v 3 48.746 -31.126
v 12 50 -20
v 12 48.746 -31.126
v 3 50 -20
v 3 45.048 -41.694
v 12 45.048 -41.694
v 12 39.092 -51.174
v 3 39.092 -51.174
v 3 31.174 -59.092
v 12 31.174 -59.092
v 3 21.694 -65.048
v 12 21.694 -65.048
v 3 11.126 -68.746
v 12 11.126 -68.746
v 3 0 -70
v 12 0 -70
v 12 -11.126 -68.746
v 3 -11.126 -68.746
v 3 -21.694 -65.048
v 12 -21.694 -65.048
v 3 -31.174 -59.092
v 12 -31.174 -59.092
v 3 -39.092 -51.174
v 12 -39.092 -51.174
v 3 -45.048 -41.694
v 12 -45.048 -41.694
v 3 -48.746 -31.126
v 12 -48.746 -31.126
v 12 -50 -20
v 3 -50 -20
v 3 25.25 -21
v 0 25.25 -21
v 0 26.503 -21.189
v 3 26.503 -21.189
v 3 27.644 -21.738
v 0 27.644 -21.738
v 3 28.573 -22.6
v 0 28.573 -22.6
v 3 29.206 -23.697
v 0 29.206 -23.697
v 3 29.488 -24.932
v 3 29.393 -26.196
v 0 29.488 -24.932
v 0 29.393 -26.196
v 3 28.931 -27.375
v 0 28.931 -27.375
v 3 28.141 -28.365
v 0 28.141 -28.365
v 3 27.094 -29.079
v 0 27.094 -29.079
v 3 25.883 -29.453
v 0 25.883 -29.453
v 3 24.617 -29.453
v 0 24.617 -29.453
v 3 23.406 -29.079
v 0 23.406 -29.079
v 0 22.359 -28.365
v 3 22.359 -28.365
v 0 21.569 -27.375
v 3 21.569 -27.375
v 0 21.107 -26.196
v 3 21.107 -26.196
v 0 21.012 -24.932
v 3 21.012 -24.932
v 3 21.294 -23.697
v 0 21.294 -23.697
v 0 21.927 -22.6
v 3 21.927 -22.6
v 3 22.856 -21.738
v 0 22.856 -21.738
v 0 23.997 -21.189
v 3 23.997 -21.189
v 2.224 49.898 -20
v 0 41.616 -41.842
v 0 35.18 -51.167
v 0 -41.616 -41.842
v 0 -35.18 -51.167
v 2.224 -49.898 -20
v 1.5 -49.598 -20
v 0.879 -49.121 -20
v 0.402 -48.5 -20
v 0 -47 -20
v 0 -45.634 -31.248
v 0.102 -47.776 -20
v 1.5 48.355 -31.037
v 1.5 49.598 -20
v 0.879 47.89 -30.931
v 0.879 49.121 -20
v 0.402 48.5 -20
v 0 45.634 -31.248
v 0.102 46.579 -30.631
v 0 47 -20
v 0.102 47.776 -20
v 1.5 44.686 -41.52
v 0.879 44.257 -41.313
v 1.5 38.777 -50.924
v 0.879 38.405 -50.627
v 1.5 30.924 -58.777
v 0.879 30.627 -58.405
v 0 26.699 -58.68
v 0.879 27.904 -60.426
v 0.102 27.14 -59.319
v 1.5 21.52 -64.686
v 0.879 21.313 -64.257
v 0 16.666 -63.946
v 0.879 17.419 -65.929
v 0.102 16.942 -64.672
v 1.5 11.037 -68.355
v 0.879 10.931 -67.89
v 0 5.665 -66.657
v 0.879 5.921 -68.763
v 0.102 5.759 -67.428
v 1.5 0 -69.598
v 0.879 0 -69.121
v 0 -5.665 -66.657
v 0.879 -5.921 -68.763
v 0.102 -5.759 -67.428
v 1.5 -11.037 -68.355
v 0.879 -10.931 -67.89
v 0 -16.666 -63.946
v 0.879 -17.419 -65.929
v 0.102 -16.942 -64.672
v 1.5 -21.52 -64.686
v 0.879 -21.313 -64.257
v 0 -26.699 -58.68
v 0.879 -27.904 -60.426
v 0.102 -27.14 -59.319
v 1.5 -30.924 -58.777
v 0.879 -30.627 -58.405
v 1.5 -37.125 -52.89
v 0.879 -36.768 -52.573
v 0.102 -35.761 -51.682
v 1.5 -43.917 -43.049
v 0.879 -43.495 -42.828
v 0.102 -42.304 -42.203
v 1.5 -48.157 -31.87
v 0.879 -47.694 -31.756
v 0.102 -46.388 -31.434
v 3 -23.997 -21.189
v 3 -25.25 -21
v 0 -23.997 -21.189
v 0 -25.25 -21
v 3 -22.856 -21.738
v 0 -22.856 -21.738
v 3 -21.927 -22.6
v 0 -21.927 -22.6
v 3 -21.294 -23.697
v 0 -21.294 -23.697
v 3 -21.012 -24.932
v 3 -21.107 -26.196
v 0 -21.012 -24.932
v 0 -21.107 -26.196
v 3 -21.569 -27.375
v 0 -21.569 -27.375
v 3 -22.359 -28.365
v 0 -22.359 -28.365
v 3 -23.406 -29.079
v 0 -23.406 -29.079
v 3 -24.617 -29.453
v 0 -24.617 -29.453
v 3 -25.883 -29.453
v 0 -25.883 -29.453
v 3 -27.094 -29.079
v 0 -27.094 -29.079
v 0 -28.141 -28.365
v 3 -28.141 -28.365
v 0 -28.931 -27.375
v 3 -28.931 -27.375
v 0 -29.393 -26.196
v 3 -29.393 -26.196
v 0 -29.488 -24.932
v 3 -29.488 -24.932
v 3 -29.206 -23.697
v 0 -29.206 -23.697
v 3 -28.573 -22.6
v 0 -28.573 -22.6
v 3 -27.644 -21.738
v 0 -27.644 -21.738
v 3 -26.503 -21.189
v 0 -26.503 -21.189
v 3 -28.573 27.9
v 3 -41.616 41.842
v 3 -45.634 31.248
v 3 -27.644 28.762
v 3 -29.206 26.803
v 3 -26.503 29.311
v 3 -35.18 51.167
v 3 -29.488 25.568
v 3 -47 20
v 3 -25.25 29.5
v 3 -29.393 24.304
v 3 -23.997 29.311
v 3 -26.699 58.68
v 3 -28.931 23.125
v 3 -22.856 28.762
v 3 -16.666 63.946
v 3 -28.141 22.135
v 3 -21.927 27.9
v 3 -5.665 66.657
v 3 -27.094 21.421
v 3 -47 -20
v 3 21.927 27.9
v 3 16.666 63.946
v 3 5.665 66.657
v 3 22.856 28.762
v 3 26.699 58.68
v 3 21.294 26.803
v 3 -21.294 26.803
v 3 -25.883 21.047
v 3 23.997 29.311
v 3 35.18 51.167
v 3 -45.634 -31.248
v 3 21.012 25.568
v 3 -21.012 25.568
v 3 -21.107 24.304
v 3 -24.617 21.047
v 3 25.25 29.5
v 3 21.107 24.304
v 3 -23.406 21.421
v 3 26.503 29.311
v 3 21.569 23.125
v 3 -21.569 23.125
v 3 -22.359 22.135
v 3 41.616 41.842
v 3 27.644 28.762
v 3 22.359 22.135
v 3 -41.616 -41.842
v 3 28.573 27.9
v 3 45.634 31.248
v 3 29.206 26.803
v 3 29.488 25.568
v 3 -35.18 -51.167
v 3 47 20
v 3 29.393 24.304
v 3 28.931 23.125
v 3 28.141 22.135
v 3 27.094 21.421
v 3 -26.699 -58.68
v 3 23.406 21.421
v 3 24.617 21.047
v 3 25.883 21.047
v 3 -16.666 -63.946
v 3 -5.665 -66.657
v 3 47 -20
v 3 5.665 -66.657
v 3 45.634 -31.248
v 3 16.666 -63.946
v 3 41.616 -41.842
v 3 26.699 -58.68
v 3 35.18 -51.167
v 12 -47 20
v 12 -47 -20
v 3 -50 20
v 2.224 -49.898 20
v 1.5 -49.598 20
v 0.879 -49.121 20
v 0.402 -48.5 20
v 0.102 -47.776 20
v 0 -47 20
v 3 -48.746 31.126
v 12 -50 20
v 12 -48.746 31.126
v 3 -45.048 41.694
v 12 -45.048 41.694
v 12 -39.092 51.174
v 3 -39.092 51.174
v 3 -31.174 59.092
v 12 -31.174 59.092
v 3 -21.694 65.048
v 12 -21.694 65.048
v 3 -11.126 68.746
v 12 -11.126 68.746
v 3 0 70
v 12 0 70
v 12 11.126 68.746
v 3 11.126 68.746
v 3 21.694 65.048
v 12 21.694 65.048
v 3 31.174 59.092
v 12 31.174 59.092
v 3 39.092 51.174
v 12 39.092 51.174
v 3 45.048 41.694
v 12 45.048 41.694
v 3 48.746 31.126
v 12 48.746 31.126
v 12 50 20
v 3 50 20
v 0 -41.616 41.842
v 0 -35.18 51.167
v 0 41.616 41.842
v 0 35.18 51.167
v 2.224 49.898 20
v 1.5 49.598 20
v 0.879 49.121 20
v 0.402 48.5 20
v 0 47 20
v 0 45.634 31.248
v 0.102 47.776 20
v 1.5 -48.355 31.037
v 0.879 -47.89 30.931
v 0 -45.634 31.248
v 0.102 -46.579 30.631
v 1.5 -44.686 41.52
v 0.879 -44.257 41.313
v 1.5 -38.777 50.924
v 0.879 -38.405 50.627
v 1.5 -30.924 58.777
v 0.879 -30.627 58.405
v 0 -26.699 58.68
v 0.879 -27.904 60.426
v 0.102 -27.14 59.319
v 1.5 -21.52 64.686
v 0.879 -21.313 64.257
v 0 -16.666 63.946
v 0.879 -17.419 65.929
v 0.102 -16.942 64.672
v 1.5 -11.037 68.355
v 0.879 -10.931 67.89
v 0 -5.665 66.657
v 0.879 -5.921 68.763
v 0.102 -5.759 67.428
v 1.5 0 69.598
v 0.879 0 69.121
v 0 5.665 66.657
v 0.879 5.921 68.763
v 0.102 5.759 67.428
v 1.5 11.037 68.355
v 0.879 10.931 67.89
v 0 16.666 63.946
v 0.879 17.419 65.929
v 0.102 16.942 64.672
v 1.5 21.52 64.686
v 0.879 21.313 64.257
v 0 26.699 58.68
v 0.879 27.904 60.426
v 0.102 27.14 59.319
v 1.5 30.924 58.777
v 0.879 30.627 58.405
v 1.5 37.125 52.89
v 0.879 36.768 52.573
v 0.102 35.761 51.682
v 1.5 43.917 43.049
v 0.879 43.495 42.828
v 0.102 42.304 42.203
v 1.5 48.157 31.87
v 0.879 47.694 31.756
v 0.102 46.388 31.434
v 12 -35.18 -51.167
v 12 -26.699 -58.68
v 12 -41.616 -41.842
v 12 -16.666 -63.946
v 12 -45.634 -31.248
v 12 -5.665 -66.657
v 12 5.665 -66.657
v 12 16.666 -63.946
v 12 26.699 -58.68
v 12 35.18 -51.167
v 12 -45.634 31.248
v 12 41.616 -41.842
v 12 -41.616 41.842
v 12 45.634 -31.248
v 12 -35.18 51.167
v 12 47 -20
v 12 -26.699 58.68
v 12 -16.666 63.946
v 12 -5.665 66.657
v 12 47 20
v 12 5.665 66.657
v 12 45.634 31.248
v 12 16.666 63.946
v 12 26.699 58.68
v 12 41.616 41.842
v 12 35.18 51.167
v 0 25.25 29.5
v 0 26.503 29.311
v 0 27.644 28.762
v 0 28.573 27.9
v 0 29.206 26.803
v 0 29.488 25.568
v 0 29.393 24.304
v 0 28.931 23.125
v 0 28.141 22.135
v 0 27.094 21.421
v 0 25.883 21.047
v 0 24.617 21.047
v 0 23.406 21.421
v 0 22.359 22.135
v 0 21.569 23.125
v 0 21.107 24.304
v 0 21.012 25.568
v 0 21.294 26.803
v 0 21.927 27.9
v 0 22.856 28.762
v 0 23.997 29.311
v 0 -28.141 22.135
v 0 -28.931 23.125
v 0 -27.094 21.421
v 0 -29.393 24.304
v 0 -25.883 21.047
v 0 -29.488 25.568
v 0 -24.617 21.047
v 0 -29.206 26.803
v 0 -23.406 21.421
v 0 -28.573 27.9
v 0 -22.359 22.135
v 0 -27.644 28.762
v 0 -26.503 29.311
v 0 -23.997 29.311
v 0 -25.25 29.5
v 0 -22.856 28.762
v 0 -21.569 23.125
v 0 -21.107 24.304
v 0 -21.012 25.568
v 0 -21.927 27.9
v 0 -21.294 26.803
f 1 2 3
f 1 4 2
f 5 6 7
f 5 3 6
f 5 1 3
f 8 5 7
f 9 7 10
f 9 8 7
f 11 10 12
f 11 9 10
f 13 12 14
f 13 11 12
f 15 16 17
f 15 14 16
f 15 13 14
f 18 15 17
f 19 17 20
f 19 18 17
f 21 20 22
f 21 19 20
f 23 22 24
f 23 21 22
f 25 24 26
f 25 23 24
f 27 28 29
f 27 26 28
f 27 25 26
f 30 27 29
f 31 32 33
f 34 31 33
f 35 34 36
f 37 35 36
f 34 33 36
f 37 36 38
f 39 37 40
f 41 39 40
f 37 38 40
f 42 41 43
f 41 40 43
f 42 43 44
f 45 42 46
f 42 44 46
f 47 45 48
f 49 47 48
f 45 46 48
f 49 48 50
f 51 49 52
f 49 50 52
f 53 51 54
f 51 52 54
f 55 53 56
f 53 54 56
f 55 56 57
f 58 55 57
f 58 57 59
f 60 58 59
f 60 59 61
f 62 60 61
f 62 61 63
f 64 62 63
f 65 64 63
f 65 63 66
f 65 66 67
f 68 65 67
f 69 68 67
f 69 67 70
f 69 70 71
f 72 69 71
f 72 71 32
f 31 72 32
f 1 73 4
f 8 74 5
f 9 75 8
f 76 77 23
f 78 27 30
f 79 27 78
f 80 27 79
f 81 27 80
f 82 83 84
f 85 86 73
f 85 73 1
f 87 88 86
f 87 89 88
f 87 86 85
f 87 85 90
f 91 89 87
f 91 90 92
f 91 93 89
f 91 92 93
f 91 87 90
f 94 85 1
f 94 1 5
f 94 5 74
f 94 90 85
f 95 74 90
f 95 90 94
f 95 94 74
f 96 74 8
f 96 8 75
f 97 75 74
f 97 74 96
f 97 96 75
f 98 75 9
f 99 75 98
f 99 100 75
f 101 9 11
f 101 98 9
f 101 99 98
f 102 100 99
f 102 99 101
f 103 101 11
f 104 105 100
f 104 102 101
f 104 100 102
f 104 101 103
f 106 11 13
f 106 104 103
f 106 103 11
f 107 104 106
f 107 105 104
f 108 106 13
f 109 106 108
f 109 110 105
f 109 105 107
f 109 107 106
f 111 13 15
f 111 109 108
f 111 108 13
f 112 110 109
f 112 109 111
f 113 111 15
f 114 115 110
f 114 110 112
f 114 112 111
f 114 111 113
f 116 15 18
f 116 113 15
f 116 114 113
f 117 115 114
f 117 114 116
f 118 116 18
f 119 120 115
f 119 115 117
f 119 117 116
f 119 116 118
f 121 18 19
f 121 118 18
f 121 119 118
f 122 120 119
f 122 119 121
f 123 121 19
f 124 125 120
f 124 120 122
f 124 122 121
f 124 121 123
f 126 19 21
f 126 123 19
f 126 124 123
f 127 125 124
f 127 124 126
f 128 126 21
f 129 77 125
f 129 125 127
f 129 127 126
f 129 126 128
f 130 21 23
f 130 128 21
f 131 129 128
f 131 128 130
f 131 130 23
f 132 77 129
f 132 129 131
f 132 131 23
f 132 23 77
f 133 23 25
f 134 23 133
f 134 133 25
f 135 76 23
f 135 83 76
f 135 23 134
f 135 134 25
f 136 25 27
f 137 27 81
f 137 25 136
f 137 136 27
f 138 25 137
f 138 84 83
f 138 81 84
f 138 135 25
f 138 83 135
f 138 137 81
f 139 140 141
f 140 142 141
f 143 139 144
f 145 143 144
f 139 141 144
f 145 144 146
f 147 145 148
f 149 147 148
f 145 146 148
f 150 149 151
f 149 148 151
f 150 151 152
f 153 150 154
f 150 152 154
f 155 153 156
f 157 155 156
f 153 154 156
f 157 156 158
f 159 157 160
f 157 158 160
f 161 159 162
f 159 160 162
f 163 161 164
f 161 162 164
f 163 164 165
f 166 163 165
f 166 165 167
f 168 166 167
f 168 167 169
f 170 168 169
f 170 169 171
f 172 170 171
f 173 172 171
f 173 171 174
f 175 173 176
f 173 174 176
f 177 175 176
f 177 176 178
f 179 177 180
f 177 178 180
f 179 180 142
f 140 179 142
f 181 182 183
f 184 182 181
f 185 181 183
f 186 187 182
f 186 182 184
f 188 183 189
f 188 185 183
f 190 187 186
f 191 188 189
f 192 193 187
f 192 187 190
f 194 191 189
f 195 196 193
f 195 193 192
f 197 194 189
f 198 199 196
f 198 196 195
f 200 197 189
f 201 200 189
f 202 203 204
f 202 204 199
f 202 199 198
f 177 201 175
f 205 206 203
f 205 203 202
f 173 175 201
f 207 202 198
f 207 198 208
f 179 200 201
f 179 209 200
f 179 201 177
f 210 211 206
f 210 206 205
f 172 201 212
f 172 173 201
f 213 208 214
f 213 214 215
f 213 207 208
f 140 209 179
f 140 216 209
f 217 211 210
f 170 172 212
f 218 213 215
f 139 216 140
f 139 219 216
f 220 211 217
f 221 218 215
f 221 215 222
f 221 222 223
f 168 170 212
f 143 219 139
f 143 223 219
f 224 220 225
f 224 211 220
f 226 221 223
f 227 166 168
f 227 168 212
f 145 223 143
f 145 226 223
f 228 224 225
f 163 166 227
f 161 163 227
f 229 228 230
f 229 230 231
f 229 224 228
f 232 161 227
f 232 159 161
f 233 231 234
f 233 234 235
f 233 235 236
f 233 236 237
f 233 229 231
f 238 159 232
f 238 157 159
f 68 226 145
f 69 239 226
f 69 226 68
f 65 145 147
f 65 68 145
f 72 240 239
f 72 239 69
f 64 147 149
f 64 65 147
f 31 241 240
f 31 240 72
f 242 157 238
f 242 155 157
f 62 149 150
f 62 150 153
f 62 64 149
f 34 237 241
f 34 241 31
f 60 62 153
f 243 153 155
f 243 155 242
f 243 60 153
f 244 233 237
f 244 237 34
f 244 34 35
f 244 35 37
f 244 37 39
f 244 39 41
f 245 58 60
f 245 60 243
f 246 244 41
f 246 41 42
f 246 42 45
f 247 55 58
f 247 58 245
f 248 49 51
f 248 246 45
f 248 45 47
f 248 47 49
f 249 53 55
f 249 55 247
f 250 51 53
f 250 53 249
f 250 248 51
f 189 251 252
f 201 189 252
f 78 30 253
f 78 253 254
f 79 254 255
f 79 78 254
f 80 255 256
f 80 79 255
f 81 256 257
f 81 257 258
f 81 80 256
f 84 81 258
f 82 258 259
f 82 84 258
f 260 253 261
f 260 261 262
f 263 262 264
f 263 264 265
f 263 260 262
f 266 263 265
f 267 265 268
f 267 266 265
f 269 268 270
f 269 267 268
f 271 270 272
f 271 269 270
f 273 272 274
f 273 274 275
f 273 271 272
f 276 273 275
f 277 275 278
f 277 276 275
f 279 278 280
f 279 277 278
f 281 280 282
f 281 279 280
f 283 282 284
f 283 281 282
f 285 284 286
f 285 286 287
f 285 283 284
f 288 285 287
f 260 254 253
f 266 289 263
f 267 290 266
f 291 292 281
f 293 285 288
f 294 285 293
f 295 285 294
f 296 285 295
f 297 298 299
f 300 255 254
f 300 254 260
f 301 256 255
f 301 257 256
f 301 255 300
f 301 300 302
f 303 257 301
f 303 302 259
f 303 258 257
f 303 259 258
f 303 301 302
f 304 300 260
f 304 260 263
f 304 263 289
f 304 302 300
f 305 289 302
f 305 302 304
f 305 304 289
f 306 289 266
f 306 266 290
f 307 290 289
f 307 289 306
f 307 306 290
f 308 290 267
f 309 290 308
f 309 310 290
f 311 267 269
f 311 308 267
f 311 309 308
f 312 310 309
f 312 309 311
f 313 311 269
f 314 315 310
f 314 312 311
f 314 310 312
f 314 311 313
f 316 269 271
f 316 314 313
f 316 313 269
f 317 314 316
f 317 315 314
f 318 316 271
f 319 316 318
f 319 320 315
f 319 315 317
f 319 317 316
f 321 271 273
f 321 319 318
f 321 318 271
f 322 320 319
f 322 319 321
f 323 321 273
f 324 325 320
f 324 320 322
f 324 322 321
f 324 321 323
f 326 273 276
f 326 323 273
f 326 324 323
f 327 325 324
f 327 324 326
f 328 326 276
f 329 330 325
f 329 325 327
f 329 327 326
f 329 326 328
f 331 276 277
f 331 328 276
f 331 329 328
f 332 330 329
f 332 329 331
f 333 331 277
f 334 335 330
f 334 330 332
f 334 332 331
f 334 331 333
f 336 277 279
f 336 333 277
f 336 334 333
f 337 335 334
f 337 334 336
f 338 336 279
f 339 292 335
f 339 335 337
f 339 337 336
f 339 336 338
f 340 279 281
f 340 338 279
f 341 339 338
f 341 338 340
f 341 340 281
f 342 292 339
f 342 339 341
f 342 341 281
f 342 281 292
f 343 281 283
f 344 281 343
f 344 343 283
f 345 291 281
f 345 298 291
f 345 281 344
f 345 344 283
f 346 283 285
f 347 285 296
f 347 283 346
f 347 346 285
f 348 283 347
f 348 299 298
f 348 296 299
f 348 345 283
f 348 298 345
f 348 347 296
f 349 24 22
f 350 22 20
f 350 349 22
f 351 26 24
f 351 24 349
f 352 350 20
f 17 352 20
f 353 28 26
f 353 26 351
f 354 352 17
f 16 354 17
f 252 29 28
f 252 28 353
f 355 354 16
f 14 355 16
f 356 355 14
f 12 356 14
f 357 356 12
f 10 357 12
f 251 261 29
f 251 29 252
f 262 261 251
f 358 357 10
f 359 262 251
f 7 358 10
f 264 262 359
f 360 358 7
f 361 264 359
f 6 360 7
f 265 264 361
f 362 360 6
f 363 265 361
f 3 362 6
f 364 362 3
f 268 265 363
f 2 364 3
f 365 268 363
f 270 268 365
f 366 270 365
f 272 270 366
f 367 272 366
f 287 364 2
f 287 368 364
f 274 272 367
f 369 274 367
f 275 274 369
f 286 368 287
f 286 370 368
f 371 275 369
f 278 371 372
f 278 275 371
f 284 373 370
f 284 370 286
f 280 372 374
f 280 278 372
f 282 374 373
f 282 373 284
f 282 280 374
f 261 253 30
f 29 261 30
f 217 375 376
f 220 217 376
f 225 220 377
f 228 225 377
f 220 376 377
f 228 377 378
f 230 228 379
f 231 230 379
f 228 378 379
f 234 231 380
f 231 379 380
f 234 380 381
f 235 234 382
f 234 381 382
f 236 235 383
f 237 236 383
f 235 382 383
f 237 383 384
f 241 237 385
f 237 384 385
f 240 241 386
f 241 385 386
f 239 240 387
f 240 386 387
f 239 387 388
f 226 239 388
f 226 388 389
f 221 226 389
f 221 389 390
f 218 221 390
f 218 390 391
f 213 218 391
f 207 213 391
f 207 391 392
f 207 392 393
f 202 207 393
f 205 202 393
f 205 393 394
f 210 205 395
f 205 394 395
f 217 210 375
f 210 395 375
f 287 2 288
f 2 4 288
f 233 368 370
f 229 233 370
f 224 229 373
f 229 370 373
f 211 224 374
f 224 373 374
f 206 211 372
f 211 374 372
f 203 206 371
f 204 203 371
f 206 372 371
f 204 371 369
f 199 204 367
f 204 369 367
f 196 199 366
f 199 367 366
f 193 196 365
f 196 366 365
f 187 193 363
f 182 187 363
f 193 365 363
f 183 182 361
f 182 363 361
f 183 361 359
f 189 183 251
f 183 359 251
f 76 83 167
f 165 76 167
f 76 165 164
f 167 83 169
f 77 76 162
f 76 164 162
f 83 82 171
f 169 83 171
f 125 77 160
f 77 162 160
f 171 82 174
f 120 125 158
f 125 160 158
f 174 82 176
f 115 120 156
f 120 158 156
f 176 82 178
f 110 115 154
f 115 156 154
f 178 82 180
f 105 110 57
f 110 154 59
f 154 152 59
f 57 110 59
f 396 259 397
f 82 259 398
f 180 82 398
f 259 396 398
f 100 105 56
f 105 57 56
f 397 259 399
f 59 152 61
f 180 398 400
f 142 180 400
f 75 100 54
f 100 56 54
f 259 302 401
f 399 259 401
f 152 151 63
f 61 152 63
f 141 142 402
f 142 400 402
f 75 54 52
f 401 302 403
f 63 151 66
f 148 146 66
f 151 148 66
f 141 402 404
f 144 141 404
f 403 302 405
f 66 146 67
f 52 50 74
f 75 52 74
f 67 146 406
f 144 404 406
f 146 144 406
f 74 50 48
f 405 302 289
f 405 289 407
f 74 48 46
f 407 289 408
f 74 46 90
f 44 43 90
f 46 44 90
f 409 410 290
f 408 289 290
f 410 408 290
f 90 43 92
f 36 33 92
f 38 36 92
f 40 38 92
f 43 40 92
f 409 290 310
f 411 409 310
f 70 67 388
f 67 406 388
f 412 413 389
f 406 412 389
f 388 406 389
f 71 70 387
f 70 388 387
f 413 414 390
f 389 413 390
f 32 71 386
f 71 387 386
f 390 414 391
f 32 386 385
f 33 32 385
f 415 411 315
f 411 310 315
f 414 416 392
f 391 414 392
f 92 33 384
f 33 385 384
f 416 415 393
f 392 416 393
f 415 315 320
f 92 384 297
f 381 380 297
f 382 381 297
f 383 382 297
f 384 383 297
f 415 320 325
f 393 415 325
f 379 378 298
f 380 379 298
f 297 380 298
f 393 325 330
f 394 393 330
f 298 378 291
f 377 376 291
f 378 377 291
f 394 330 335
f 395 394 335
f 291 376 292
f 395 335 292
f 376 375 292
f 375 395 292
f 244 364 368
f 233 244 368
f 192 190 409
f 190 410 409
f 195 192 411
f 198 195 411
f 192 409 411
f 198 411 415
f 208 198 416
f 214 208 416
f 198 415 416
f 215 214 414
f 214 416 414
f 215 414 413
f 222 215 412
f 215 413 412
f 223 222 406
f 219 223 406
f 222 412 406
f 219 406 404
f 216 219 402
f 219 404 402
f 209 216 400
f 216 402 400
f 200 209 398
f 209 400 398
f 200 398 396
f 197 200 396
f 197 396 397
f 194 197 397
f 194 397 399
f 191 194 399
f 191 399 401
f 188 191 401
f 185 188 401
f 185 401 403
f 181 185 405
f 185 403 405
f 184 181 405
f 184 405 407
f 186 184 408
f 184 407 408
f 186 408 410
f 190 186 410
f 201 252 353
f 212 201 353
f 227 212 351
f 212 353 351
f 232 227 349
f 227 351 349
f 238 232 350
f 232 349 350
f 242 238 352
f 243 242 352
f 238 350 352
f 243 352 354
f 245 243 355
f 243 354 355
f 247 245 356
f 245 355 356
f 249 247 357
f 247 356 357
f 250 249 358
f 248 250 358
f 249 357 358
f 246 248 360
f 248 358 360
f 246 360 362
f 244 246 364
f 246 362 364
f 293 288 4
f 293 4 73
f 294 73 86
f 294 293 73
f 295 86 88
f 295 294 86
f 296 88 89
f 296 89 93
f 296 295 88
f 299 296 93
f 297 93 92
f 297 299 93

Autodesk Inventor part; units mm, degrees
ref_plane "YZ Plane" through (0, 0, 0) normal (1, 0, 0) x (0, 1, 0)
ref_plane "XZ Plane" through (0, 0, 0) normal (0, 1, 0) x (-1, 0, 0)
ref_plane "XY Plane" through (0, 0, 0) normal (0, 0, 1) x (1, 0, 0)
sketch "Náčrt1" plane through (0, 0, 0) normal (1, 0, 0) x (0, 1, 0)
  line L0 (50, 70) -> (-50, 70)
  line L1 (-50, 70) -> (-50, -70)
  line L2 (-50, -70) -> (50, -70)
  line L3 (50, -20) -> (50, 70)
  arc A0 (50, 20) -> (-50, 20) centre (0, 20) ccw
  arc A1 (-50, -20) -> (50, -20) centre (0, -20) ccw
  point P0 (0, 0)
  dimension "d0" = 100
  dimension "d1" = 140
  dimension "d2" = 50
  dimension "d3" = 70
  dimension "d4" = 100
  dimension "d8" = 100
extrude "Vysunutí2" add sketch "Náčrt1" along normal blind 12 contours A0 L3 A1 L1
sketch "Náčrt2" plane through (12, 0, 0) normal (1, 0, 0) x (0, 0, -1)
  arc A0 (-20, 50) -> (-20, -50) centre (-20, 0) ccw projected
  line L0 (-20, -50) -> (20, -50) projected
  arc A1 (20, -50) -> (20, 50) centre (20, 0) ccw projected
  line L1 (20, 50) -> (-20, 50) projected
  arc A2 (-20, 47) -> (-20, -47) centre (-20, 0) ccw
  line L2 (-20, -47) -> (20, -47)
  arc A3 (20, -47) -> (20, 47) centre (20, 0) ccw
  line L3 (20, 47) -> (-20, 47)
  point P0 (0, 0)
  dimension "d11" = 3
extrude "Vysunutí3" cut sketch "Náčrt2" against normal blind 9 contours L3 A3 L2 A2
sketch "Náčrt4" plane through (0, 0, 0) normal (-1, 0, 0) x (0, 0, 1)
  circle A0 centre (25.25, -25.25) radius 4.25
  arc A1 (20, -50) -> (20, 50) centre (20, 0) ccw projected
  line L0 (-20, 50) -> (20, 50) projected
  arc A2 (-20, 50) -> (-20, -50) centre (-20, 0) ccw projected
  line L1 (20, -50) -> (-20, -50) projected
  arc A3 (20, -50) -> (20, 50) centre (20, 0) ccw projected
  circle A4 centre (25.25, 25.25) radius 4.25
  circle A5 centre (-25.25, 25.25) radius 4.25
  circle A6 centre (-25.25, -25.25) radius 4.25
  point P0 (0, 0)
  point P1 (70, 0)
  dimension "d25" = 8.5
  dimension "d26" = 24.75
  dimension "d27" = 44.75
  dimension "d32" = 360
extrude "Vysunutí5" cut sketch "Náčrt4" against normal through all contours A0 | A4 | A5 | A6
fillet "Zaoblení2" radius 3 4 edges at (0, -50, 0) (0, 0, -70) (0, 50, 0) (0, 0, 70)
properties part number "Anténní držák"
